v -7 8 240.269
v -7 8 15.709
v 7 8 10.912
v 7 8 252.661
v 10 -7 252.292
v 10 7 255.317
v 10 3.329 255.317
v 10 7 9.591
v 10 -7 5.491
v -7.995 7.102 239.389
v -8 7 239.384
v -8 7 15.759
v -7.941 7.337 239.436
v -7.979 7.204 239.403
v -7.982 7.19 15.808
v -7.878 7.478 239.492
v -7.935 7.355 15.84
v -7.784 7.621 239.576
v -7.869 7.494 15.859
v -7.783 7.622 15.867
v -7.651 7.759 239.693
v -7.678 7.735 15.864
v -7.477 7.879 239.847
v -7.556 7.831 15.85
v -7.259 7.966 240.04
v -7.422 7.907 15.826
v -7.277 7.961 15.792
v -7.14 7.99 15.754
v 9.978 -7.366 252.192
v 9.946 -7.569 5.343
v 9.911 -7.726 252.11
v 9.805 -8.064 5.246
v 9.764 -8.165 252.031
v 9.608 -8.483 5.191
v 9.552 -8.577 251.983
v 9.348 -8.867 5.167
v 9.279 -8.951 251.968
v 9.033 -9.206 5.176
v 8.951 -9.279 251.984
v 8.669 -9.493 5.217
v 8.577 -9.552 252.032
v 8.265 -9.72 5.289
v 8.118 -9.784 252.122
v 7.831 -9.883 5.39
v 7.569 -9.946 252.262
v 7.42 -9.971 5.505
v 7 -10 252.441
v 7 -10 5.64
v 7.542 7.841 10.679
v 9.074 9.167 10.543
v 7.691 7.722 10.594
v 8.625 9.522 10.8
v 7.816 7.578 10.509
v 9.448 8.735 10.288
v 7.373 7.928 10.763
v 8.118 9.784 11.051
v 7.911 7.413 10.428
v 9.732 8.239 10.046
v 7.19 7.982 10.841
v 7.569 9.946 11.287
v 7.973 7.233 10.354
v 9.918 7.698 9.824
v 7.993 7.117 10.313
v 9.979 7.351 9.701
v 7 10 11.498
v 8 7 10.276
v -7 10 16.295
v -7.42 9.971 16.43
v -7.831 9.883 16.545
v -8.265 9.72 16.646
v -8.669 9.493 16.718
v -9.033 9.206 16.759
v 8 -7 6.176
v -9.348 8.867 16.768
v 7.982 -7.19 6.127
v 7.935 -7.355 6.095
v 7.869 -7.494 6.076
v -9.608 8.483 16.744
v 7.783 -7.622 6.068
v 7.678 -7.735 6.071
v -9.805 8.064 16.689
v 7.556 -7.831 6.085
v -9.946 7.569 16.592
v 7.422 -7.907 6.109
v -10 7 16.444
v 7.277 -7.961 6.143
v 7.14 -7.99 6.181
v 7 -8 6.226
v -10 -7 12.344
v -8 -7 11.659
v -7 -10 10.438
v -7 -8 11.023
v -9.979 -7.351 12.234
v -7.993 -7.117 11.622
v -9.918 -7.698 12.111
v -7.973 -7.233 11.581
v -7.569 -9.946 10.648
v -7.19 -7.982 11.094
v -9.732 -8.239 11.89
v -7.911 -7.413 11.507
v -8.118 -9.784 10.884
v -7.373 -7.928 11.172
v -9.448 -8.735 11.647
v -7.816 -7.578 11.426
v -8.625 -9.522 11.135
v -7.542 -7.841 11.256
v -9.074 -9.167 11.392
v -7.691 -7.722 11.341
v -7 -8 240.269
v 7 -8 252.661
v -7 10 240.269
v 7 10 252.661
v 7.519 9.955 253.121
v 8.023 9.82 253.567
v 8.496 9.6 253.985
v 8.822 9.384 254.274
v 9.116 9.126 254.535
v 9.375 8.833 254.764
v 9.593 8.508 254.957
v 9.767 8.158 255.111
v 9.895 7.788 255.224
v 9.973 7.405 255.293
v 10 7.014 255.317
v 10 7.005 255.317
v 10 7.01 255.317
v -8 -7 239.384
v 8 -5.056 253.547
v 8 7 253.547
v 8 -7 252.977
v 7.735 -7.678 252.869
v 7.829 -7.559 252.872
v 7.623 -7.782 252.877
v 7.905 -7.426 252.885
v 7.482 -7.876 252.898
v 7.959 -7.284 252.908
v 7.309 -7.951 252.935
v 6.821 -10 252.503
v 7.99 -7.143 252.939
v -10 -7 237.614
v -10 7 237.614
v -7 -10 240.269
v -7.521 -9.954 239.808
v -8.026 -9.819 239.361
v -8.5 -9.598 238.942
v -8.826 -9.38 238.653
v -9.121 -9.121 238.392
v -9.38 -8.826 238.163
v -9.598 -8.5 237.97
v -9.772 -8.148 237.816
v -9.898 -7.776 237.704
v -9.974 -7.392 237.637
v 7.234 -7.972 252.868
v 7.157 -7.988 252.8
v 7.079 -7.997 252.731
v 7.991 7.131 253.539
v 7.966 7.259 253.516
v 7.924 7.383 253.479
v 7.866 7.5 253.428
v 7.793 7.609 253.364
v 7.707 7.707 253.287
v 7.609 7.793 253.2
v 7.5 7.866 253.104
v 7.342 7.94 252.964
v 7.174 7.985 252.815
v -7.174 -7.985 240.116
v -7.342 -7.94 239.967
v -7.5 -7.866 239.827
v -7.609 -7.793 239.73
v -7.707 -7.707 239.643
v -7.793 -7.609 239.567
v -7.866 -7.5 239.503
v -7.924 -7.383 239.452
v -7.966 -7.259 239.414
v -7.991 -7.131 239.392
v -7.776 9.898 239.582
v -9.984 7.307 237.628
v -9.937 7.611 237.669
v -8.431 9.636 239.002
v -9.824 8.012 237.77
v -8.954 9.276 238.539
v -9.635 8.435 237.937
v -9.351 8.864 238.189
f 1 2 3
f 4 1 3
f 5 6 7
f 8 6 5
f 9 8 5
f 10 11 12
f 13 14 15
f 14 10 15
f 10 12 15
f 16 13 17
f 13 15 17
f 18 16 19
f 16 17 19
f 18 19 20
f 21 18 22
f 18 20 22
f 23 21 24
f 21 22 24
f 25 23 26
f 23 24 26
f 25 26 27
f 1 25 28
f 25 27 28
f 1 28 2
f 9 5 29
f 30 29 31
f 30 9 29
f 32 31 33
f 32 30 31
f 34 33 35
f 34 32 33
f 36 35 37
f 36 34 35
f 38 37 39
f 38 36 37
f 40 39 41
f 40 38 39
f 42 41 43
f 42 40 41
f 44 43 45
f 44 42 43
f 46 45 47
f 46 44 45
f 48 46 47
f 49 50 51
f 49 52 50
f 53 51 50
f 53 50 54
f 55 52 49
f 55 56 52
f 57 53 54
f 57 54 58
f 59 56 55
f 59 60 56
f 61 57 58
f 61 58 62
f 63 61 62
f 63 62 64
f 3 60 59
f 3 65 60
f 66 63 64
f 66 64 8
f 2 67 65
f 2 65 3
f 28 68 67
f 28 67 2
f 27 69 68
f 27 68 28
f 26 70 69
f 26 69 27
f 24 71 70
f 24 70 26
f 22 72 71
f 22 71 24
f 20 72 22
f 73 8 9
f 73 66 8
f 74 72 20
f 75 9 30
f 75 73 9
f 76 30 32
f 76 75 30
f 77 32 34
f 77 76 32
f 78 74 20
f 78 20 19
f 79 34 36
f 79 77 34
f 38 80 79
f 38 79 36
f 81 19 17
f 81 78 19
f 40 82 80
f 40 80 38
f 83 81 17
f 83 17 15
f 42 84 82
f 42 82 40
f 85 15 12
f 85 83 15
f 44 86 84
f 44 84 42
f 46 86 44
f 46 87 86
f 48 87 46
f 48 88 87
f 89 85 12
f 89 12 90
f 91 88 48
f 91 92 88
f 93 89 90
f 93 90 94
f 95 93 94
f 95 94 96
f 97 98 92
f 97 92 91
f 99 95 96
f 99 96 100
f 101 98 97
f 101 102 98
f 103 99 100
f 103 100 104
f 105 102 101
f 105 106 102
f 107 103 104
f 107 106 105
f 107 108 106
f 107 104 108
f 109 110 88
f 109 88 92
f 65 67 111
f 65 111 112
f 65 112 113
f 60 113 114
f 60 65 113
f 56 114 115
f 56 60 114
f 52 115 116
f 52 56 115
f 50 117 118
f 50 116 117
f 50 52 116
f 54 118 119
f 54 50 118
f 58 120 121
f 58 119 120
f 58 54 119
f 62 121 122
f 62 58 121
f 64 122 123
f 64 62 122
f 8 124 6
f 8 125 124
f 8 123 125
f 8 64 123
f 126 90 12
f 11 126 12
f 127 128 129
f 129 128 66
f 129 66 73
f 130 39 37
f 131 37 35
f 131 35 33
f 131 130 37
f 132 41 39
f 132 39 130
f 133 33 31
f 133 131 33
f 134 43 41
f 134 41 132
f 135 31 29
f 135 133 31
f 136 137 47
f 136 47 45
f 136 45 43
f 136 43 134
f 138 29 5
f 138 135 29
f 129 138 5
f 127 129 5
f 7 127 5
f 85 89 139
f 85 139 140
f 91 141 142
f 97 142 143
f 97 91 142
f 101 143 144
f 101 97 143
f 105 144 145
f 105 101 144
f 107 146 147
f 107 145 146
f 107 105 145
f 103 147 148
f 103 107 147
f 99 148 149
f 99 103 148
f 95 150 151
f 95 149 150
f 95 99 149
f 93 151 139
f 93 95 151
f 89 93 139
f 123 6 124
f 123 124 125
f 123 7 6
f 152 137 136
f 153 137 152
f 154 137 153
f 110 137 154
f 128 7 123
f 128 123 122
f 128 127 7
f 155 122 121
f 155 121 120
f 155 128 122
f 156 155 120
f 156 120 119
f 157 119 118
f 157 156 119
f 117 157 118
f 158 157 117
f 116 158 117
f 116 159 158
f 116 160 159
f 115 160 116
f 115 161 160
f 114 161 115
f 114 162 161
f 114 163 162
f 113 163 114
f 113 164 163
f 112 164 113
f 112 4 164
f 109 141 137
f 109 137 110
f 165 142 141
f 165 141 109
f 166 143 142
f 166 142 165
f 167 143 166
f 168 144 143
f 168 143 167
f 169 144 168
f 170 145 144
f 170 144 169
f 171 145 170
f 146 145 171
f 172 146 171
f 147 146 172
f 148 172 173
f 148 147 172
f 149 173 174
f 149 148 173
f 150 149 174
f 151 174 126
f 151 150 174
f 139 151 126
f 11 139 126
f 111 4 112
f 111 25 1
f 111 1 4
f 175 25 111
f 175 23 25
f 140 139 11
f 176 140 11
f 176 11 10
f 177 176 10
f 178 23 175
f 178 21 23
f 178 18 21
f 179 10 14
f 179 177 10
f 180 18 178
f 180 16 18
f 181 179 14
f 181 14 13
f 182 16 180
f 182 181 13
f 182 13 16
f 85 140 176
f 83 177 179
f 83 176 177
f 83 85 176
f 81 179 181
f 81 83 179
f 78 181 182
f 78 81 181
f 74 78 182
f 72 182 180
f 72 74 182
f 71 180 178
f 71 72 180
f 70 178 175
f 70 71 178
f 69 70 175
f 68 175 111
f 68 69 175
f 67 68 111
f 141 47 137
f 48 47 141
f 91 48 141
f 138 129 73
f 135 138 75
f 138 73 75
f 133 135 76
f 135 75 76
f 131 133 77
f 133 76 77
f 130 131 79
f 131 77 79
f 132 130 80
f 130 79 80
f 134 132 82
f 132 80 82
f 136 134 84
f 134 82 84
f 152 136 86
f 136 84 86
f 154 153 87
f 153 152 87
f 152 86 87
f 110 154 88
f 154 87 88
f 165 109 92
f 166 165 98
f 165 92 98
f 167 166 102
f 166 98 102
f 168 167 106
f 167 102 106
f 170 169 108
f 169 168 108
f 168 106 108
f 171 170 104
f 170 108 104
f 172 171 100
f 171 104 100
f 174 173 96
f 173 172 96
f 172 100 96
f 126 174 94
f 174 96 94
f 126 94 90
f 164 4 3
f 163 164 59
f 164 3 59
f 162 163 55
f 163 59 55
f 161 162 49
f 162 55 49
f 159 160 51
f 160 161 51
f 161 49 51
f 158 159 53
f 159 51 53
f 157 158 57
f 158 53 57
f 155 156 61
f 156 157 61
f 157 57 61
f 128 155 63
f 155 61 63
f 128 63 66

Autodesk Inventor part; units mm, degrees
ref_plane "Start Plane" through (0, 0, 4.614) normal (0, 0, 1) x (1, 0, 0)
ref_plane "End Plane" through (0, 0, 255.3168) normal (0, 0, 1) x (1, 0, 0)
sketch "Sketch" plane through (0, 0, 0) normal (0, 0, 1) x (1, 0, 0)
  line L0 (-10, -7) -> (-10, 7)
  line L1 (-7, 10) -> (7, 10)
  line L2 (10, 7) -> (10, -7)
  line L3 (7, -10) -> (-7, -10)
  arc A0 (-10, -7) -> (-7, -10) centre (-7, -7) ccw
  arc A1 (-7, 10) -> (-10, 7) centre (-7, 7) ccw
  arc A2 (10, 7) -> (7, 10) centre (7, 7) ccw
  arc A3 (7, -10) -> (10, -7) centre (7, -7) ccw
  arc A4 (-7, 8) -> (-8, 7) centre (-7, 7) ccw
  line L4 (-7, 8) -> (7, 8)
  arc A5 (8, 7) -> (7, 8) centre (7, 7) ccw
  line L5 (8, 7) -> (8, -7)
  arc A6 (7, -8) -> (8, -7) centre (7, -7) ccw
  line L6 (7, -8) -> (-7, -8)
  arc A7 (-8, -7) -> (-7, -8) centre (-7, -7) ccw
  line L7 (-8, -7) -> (-8, 7)
  line L8 (0, 14.8698) -> (0, -14.8698) construction
  line L9 (-14.8698, 0) -> (14.8698, 0) construction
  dimension "d7" = 3
  dimension "d10" = 20
  dimension "d11" = 20
  dimension "d12" = 2
  dimension "d15" = 10
  dimension "d16" = 10
extrude "Body" add sketch "Sketch" along normal up to surface (250.7028 mm away) from surface at 4.614
sketch "Sketch3" plane through (0, 0, 0) normal (0, 0, 1) x (1, 0, 0)
  line L0 (0, 0) -> (10, 0)
ref_plane "Work Plane3" through (0, 0, 0) normal (0, -1, 0) x (1, 0, 0)
sketch "Sketch4" plane through (0, 0, 0) normal (0, -1, 0) x (1, 0, 0)
  line L0 (-2, 4.614) -> (12, 4.614)
  line L1 (-2, 255.3168) -> (12, 255.3168)
  dimension "d18" = 250.7028
ref_plane "Work Plane4" through (10.1657, 0, 255.4635) normal (-0.6628, 0, 0.7488) x (0.7488, 0, 0.6628)
split "Split1" plane through (10.1657, 0, 255.4635) removes the side toward (-0.6628, 0, 0.7488)
ref_plane "Work Plane8" through (3.7296, 4.0763, 257.6842) normal (0.3124, -0.267, 0.9117) x (0.949, 0.0436, -0.3124)
split "Split2" plane through (3.7296, 4.0763, 257.6842) removes the side toward (0.3124, -0.267, 0.9117)
ref_plane "Work Plane9" through (-284.1797, -10.0613, 105.397) normal (-0.3124, 0.267, -0.9117) x (-0.1048, 0.9442, 0.3124)
split "Split3" plane through (-284.1797, -10.0613, 105.397) removes the side toward (-0.3124, 0.267, -0.9117)
equation "\"d7\" = G_IR"
equation "\"d10\" = G_H"
equation "\"d11\" = G_W"
equation "\"d12\" = G_T"
equation "\"d15\" = 0.5 * d10"
equation "\"d16\" = 0.5 * d11"
equation "\"d3\" = G_L"
equation "\"G_W\" = 20"
equation "\"G_H\" = 20"
equation "\"G_T\" = 2"
equation "\"G_IR\" = 3"
equation "\"G_L\" = 250.12582"
equation "\"G_OFFSET_START\" = -4.61403"
equation "\"G_OFFSET_END\" = 8.51725"
equation "\"d13\" = -G_OFFSET_START"
equation "\"d14\" = G_OFFSET_END + B_L"
equation "\"B_L\" = 246.79957"
properties part number "ISO 12633-2 - 20x20x2 - 250,13" material "Steel, Mild"
